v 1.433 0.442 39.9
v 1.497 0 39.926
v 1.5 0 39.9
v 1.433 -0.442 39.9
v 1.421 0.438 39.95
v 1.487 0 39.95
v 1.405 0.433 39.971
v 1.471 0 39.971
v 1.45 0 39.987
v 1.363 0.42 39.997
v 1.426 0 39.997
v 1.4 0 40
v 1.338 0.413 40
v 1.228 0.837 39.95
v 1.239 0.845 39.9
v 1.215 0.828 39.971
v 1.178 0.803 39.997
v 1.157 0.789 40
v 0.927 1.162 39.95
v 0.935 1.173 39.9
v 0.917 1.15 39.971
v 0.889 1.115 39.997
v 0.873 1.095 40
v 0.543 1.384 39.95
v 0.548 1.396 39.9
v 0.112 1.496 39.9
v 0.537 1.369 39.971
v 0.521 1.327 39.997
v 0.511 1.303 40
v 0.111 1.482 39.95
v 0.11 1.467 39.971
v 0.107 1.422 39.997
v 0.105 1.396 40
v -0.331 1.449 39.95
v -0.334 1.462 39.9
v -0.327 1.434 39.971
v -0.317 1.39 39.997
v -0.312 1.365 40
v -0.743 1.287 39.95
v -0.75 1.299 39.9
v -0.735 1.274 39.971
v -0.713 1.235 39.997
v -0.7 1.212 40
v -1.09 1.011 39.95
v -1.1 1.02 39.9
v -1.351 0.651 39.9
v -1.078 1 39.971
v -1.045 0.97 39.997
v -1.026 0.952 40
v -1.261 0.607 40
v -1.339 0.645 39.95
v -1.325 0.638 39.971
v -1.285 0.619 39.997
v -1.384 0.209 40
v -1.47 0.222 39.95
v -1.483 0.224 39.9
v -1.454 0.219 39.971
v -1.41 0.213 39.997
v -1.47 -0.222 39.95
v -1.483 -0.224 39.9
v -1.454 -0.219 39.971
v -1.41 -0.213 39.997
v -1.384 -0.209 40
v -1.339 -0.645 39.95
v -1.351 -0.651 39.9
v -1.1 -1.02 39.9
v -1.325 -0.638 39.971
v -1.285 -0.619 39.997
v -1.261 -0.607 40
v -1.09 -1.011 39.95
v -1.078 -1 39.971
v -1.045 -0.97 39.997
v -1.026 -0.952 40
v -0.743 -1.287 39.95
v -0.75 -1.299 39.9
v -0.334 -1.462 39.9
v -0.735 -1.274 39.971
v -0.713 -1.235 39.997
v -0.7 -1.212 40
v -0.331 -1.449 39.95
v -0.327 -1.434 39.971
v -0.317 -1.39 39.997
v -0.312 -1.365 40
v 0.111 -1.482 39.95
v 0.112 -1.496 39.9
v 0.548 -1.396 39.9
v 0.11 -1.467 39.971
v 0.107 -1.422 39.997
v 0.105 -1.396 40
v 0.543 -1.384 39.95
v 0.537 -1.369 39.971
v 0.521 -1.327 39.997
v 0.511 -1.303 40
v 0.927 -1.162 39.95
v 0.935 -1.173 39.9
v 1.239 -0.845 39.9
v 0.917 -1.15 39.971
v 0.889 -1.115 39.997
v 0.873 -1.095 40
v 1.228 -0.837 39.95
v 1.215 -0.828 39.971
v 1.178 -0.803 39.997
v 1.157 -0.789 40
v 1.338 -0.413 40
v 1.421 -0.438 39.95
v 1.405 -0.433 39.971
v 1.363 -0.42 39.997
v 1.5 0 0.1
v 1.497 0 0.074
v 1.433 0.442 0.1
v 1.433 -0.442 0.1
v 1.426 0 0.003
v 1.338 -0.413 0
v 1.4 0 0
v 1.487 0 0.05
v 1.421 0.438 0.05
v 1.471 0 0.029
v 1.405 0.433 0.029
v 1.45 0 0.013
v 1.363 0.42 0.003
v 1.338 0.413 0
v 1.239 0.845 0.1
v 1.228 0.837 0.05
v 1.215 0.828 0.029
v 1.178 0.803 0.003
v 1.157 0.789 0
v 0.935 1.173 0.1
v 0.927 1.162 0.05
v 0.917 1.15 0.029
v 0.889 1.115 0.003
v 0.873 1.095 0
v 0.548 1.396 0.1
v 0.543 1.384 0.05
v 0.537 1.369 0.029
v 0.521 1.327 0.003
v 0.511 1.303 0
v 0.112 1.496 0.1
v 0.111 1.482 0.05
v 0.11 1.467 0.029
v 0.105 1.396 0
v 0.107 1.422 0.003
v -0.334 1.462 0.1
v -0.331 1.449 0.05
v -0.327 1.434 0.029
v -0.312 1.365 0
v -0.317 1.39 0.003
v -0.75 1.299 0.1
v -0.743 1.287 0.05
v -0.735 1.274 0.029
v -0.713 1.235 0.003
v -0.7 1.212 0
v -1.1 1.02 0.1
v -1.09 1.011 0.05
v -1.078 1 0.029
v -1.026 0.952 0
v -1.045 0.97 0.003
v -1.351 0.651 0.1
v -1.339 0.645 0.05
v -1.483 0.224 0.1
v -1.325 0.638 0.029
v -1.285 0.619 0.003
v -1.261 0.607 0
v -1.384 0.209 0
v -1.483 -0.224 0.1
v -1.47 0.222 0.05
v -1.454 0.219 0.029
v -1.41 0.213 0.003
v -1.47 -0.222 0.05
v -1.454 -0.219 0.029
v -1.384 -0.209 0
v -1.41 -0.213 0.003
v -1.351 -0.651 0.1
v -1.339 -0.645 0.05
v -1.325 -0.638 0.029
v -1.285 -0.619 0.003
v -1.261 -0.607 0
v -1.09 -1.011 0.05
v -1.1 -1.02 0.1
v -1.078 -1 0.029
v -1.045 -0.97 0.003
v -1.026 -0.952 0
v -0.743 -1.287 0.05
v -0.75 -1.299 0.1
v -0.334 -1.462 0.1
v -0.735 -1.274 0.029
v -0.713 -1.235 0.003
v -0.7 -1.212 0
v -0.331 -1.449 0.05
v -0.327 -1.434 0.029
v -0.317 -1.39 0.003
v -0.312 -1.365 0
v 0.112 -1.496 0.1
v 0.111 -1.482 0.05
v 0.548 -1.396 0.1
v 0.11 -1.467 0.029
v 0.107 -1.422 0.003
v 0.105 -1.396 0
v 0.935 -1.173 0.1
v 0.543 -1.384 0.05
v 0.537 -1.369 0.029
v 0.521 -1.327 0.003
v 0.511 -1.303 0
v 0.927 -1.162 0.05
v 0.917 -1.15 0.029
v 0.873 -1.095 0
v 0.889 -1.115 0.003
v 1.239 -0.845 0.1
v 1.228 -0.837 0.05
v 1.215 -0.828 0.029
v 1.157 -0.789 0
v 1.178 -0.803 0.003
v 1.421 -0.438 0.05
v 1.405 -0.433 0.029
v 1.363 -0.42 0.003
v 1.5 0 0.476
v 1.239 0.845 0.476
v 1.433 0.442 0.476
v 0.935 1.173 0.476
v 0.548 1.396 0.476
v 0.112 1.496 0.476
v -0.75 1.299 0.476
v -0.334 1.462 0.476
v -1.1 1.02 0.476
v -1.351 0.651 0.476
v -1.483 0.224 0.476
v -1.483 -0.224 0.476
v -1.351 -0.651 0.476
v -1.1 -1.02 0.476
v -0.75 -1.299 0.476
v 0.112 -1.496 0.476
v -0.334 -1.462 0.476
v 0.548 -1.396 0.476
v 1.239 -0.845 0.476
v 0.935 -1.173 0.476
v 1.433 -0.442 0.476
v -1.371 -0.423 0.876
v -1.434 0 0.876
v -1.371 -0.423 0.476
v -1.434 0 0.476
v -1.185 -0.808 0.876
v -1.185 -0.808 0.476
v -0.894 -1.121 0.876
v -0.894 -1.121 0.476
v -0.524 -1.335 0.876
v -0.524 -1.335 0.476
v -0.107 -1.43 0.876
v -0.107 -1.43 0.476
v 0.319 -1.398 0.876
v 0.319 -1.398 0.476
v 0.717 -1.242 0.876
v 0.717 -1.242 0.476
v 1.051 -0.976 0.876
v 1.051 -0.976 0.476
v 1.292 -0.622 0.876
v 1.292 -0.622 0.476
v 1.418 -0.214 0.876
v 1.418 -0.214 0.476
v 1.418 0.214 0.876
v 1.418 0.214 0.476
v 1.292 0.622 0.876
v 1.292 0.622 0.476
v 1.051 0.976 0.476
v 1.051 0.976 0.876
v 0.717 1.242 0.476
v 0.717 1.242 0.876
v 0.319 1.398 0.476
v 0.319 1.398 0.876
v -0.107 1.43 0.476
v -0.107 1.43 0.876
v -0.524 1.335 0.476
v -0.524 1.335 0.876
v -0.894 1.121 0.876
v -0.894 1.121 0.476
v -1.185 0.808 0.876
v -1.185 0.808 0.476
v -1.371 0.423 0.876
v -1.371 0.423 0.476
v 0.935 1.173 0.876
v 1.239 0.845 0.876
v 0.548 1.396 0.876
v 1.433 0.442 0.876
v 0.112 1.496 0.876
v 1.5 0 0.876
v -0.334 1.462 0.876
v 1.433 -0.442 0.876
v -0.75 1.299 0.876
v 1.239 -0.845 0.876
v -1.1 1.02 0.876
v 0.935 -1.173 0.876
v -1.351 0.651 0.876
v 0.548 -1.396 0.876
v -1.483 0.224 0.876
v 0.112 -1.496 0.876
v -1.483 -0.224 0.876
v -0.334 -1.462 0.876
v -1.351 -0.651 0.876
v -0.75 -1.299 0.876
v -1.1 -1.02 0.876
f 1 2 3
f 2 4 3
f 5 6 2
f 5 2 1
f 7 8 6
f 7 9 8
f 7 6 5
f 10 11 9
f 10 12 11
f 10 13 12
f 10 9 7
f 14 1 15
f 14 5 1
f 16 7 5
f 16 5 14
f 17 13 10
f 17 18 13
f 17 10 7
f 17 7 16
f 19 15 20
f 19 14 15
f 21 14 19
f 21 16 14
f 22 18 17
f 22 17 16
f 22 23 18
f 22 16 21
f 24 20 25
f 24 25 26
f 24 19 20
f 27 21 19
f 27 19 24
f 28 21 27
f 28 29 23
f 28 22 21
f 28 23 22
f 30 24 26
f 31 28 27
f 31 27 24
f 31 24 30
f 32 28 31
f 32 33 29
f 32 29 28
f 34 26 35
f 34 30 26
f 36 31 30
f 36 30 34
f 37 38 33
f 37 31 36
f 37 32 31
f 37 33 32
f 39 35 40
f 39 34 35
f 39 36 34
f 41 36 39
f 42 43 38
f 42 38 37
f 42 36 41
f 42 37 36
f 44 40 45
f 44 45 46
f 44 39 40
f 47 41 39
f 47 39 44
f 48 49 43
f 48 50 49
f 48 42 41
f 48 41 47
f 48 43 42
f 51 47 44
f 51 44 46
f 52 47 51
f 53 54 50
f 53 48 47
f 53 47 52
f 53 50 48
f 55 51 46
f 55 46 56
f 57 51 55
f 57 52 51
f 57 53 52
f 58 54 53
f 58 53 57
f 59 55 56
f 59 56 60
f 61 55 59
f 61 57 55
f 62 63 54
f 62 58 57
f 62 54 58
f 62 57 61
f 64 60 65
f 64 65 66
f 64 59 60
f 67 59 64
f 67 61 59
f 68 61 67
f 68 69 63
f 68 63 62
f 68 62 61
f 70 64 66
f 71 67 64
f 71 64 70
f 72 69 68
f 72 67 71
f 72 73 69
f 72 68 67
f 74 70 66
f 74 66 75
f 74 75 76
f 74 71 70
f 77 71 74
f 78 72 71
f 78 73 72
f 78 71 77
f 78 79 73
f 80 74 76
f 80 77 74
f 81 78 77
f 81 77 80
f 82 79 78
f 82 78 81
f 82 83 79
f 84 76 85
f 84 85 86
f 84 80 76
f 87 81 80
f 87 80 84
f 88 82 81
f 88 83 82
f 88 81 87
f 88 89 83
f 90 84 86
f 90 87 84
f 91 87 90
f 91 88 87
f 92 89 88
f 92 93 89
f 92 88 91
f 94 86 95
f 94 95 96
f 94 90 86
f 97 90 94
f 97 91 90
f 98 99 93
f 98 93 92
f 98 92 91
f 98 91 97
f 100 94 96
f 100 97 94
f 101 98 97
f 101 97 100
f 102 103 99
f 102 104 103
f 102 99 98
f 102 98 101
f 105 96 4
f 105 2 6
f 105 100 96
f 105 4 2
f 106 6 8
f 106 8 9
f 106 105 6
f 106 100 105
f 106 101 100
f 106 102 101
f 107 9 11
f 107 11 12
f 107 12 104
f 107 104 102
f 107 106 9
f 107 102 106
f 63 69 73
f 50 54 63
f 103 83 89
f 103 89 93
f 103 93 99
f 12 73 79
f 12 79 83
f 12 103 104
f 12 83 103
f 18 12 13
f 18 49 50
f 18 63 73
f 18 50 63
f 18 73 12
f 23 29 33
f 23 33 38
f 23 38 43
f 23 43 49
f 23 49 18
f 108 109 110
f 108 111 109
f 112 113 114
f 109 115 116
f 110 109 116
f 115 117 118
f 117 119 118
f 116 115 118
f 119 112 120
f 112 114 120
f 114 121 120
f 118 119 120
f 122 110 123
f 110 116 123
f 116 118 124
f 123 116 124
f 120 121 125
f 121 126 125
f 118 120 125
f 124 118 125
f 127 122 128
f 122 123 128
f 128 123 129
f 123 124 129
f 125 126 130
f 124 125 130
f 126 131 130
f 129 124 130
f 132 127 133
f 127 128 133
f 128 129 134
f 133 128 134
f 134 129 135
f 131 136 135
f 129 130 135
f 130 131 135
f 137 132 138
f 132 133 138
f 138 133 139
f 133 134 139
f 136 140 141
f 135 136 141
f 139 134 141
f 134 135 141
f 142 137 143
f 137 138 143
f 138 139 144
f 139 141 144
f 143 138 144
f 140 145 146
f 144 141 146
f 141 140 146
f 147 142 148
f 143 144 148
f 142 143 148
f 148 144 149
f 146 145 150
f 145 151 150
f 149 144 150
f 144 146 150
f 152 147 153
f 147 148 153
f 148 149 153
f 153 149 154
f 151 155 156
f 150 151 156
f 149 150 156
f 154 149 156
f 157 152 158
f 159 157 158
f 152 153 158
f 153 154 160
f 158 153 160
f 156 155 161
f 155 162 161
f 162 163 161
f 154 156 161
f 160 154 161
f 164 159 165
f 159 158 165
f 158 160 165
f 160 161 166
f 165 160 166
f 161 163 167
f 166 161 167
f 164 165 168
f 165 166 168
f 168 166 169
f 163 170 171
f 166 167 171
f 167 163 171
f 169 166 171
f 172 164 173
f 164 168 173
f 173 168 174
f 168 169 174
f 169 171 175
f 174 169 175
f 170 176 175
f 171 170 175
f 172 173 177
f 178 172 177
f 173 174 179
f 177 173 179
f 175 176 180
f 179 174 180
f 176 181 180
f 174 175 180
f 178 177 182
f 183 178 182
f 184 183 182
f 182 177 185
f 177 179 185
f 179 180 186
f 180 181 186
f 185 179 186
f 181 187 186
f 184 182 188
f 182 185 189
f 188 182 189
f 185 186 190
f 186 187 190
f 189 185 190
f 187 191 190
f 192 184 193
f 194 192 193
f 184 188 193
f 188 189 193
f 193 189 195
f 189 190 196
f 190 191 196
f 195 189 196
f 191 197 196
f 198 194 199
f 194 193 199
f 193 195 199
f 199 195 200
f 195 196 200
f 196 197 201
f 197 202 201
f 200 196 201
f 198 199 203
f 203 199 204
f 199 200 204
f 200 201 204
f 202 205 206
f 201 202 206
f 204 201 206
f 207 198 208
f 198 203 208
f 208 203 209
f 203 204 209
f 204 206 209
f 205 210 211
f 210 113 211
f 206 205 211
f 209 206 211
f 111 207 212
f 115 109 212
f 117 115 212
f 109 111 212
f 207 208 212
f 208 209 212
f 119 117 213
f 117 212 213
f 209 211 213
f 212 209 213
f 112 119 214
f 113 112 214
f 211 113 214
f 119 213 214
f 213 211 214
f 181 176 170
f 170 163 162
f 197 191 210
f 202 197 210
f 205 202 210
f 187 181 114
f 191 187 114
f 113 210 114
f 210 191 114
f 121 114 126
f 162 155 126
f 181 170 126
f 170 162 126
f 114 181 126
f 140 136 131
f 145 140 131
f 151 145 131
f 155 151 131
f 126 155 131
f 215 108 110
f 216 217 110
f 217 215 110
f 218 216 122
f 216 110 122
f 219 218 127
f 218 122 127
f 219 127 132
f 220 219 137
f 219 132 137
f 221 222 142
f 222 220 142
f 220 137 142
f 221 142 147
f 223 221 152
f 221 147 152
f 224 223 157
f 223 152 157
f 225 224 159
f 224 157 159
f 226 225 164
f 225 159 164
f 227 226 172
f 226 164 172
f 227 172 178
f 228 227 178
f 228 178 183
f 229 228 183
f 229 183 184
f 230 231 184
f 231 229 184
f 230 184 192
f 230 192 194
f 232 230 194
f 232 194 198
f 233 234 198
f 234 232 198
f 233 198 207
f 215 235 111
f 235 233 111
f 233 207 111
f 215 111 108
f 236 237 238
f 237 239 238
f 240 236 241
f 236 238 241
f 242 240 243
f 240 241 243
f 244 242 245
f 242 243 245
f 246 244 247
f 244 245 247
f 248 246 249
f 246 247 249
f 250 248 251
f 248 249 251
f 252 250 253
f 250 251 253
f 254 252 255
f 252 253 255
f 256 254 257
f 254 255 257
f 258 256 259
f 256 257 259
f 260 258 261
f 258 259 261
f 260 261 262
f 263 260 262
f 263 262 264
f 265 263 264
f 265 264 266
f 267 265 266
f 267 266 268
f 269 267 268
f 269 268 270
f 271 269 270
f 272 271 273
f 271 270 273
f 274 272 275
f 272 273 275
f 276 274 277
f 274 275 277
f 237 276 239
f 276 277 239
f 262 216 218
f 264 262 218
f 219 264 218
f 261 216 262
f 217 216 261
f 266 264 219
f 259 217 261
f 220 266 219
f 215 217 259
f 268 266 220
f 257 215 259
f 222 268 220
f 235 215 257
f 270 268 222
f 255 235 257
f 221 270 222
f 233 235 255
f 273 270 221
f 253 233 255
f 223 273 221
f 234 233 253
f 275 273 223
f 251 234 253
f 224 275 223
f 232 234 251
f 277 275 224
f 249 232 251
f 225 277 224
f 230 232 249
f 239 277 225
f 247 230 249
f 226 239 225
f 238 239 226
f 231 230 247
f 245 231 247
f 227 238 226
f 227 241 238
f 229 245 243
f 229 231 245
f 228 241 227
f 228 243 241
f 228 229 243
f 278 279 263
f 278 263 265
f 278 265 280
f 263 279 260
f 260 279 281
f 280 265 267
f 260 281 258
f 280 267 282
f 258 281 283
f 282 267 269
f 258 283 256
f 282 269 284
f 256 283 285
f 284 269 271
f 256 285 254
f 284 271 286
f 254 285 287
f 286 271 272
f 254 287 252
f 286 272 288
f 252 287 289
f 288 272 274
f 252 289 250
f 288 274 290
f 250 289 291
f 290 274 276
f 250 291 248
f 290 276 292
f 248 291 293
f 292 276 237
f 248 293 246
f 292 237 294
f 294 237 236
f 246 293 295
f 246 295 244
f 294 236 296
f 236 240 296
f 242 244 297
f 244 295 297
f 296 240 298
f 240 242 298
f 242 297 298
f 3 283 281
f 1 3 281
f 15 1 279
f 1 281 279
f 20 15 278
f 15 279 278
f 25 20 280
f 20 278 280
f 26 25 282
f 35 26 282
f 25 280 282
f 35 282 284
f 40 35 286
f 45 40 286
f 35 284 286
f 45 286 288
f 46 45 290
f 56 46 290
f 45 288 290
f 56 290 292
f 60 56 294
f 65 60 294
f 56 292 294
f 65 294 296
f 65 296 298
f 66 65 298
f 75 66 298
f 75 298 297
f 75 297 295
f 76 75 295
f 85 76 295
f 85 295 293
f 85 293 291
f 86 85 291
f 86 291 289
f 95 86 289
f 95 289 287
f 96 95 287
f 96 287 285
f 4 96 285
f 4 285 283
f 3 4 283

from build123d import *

# Parameters (mm, degrees)
SKETCH1_R           = 1.5
BOSS_EXTRUDE1_DEPTH = 40
FILLET1_R           = 0.1
FILLET2_R           = 0.1
SKETCH2_W           = 0.148162506
SKETCH2_H           = 0.4


with BuildPart() as part:
    # Sketch1 → Boss-Extrude1 (new body)
    with BuildSketch(Plane.XY):
        Circle(SKETCH1_R)
    extrude(amount=BOSS_EXTRUDE1_DEPTH)

    # Fillet1
    fillet1_edges = [part.edges().sort_by_distance(p)[0] for p in [
        (-1.5, 0, 40),
    ]]
    fillet(fillet1_edges, radius=FILLET1_R)

    # Fillet2
    fillet2_edges = [part.edges().sort_by_distance(p)[0] for p in [
        (-1.5, 0, 0),
    ]]
    fillet(fillet2_edges, radius=FILLET2_R)

    # Sketch2 → Cut-Revolve1 (revolve, cut)
    with BuildSketch(Plane(origin=(0, 0, 0), x_dir=(1, 0, 0), z_dir=(0, 1, 0))):
        with Locations((-1.508482483, -0.675553033)):
            Rectangle(SKETCH2_W, SKETCH2_H)
    revolve(axis=Axis((0, 0, 0), (0, 0, 1)), mode=Mode.SUBTRACT)


solid = part.part
